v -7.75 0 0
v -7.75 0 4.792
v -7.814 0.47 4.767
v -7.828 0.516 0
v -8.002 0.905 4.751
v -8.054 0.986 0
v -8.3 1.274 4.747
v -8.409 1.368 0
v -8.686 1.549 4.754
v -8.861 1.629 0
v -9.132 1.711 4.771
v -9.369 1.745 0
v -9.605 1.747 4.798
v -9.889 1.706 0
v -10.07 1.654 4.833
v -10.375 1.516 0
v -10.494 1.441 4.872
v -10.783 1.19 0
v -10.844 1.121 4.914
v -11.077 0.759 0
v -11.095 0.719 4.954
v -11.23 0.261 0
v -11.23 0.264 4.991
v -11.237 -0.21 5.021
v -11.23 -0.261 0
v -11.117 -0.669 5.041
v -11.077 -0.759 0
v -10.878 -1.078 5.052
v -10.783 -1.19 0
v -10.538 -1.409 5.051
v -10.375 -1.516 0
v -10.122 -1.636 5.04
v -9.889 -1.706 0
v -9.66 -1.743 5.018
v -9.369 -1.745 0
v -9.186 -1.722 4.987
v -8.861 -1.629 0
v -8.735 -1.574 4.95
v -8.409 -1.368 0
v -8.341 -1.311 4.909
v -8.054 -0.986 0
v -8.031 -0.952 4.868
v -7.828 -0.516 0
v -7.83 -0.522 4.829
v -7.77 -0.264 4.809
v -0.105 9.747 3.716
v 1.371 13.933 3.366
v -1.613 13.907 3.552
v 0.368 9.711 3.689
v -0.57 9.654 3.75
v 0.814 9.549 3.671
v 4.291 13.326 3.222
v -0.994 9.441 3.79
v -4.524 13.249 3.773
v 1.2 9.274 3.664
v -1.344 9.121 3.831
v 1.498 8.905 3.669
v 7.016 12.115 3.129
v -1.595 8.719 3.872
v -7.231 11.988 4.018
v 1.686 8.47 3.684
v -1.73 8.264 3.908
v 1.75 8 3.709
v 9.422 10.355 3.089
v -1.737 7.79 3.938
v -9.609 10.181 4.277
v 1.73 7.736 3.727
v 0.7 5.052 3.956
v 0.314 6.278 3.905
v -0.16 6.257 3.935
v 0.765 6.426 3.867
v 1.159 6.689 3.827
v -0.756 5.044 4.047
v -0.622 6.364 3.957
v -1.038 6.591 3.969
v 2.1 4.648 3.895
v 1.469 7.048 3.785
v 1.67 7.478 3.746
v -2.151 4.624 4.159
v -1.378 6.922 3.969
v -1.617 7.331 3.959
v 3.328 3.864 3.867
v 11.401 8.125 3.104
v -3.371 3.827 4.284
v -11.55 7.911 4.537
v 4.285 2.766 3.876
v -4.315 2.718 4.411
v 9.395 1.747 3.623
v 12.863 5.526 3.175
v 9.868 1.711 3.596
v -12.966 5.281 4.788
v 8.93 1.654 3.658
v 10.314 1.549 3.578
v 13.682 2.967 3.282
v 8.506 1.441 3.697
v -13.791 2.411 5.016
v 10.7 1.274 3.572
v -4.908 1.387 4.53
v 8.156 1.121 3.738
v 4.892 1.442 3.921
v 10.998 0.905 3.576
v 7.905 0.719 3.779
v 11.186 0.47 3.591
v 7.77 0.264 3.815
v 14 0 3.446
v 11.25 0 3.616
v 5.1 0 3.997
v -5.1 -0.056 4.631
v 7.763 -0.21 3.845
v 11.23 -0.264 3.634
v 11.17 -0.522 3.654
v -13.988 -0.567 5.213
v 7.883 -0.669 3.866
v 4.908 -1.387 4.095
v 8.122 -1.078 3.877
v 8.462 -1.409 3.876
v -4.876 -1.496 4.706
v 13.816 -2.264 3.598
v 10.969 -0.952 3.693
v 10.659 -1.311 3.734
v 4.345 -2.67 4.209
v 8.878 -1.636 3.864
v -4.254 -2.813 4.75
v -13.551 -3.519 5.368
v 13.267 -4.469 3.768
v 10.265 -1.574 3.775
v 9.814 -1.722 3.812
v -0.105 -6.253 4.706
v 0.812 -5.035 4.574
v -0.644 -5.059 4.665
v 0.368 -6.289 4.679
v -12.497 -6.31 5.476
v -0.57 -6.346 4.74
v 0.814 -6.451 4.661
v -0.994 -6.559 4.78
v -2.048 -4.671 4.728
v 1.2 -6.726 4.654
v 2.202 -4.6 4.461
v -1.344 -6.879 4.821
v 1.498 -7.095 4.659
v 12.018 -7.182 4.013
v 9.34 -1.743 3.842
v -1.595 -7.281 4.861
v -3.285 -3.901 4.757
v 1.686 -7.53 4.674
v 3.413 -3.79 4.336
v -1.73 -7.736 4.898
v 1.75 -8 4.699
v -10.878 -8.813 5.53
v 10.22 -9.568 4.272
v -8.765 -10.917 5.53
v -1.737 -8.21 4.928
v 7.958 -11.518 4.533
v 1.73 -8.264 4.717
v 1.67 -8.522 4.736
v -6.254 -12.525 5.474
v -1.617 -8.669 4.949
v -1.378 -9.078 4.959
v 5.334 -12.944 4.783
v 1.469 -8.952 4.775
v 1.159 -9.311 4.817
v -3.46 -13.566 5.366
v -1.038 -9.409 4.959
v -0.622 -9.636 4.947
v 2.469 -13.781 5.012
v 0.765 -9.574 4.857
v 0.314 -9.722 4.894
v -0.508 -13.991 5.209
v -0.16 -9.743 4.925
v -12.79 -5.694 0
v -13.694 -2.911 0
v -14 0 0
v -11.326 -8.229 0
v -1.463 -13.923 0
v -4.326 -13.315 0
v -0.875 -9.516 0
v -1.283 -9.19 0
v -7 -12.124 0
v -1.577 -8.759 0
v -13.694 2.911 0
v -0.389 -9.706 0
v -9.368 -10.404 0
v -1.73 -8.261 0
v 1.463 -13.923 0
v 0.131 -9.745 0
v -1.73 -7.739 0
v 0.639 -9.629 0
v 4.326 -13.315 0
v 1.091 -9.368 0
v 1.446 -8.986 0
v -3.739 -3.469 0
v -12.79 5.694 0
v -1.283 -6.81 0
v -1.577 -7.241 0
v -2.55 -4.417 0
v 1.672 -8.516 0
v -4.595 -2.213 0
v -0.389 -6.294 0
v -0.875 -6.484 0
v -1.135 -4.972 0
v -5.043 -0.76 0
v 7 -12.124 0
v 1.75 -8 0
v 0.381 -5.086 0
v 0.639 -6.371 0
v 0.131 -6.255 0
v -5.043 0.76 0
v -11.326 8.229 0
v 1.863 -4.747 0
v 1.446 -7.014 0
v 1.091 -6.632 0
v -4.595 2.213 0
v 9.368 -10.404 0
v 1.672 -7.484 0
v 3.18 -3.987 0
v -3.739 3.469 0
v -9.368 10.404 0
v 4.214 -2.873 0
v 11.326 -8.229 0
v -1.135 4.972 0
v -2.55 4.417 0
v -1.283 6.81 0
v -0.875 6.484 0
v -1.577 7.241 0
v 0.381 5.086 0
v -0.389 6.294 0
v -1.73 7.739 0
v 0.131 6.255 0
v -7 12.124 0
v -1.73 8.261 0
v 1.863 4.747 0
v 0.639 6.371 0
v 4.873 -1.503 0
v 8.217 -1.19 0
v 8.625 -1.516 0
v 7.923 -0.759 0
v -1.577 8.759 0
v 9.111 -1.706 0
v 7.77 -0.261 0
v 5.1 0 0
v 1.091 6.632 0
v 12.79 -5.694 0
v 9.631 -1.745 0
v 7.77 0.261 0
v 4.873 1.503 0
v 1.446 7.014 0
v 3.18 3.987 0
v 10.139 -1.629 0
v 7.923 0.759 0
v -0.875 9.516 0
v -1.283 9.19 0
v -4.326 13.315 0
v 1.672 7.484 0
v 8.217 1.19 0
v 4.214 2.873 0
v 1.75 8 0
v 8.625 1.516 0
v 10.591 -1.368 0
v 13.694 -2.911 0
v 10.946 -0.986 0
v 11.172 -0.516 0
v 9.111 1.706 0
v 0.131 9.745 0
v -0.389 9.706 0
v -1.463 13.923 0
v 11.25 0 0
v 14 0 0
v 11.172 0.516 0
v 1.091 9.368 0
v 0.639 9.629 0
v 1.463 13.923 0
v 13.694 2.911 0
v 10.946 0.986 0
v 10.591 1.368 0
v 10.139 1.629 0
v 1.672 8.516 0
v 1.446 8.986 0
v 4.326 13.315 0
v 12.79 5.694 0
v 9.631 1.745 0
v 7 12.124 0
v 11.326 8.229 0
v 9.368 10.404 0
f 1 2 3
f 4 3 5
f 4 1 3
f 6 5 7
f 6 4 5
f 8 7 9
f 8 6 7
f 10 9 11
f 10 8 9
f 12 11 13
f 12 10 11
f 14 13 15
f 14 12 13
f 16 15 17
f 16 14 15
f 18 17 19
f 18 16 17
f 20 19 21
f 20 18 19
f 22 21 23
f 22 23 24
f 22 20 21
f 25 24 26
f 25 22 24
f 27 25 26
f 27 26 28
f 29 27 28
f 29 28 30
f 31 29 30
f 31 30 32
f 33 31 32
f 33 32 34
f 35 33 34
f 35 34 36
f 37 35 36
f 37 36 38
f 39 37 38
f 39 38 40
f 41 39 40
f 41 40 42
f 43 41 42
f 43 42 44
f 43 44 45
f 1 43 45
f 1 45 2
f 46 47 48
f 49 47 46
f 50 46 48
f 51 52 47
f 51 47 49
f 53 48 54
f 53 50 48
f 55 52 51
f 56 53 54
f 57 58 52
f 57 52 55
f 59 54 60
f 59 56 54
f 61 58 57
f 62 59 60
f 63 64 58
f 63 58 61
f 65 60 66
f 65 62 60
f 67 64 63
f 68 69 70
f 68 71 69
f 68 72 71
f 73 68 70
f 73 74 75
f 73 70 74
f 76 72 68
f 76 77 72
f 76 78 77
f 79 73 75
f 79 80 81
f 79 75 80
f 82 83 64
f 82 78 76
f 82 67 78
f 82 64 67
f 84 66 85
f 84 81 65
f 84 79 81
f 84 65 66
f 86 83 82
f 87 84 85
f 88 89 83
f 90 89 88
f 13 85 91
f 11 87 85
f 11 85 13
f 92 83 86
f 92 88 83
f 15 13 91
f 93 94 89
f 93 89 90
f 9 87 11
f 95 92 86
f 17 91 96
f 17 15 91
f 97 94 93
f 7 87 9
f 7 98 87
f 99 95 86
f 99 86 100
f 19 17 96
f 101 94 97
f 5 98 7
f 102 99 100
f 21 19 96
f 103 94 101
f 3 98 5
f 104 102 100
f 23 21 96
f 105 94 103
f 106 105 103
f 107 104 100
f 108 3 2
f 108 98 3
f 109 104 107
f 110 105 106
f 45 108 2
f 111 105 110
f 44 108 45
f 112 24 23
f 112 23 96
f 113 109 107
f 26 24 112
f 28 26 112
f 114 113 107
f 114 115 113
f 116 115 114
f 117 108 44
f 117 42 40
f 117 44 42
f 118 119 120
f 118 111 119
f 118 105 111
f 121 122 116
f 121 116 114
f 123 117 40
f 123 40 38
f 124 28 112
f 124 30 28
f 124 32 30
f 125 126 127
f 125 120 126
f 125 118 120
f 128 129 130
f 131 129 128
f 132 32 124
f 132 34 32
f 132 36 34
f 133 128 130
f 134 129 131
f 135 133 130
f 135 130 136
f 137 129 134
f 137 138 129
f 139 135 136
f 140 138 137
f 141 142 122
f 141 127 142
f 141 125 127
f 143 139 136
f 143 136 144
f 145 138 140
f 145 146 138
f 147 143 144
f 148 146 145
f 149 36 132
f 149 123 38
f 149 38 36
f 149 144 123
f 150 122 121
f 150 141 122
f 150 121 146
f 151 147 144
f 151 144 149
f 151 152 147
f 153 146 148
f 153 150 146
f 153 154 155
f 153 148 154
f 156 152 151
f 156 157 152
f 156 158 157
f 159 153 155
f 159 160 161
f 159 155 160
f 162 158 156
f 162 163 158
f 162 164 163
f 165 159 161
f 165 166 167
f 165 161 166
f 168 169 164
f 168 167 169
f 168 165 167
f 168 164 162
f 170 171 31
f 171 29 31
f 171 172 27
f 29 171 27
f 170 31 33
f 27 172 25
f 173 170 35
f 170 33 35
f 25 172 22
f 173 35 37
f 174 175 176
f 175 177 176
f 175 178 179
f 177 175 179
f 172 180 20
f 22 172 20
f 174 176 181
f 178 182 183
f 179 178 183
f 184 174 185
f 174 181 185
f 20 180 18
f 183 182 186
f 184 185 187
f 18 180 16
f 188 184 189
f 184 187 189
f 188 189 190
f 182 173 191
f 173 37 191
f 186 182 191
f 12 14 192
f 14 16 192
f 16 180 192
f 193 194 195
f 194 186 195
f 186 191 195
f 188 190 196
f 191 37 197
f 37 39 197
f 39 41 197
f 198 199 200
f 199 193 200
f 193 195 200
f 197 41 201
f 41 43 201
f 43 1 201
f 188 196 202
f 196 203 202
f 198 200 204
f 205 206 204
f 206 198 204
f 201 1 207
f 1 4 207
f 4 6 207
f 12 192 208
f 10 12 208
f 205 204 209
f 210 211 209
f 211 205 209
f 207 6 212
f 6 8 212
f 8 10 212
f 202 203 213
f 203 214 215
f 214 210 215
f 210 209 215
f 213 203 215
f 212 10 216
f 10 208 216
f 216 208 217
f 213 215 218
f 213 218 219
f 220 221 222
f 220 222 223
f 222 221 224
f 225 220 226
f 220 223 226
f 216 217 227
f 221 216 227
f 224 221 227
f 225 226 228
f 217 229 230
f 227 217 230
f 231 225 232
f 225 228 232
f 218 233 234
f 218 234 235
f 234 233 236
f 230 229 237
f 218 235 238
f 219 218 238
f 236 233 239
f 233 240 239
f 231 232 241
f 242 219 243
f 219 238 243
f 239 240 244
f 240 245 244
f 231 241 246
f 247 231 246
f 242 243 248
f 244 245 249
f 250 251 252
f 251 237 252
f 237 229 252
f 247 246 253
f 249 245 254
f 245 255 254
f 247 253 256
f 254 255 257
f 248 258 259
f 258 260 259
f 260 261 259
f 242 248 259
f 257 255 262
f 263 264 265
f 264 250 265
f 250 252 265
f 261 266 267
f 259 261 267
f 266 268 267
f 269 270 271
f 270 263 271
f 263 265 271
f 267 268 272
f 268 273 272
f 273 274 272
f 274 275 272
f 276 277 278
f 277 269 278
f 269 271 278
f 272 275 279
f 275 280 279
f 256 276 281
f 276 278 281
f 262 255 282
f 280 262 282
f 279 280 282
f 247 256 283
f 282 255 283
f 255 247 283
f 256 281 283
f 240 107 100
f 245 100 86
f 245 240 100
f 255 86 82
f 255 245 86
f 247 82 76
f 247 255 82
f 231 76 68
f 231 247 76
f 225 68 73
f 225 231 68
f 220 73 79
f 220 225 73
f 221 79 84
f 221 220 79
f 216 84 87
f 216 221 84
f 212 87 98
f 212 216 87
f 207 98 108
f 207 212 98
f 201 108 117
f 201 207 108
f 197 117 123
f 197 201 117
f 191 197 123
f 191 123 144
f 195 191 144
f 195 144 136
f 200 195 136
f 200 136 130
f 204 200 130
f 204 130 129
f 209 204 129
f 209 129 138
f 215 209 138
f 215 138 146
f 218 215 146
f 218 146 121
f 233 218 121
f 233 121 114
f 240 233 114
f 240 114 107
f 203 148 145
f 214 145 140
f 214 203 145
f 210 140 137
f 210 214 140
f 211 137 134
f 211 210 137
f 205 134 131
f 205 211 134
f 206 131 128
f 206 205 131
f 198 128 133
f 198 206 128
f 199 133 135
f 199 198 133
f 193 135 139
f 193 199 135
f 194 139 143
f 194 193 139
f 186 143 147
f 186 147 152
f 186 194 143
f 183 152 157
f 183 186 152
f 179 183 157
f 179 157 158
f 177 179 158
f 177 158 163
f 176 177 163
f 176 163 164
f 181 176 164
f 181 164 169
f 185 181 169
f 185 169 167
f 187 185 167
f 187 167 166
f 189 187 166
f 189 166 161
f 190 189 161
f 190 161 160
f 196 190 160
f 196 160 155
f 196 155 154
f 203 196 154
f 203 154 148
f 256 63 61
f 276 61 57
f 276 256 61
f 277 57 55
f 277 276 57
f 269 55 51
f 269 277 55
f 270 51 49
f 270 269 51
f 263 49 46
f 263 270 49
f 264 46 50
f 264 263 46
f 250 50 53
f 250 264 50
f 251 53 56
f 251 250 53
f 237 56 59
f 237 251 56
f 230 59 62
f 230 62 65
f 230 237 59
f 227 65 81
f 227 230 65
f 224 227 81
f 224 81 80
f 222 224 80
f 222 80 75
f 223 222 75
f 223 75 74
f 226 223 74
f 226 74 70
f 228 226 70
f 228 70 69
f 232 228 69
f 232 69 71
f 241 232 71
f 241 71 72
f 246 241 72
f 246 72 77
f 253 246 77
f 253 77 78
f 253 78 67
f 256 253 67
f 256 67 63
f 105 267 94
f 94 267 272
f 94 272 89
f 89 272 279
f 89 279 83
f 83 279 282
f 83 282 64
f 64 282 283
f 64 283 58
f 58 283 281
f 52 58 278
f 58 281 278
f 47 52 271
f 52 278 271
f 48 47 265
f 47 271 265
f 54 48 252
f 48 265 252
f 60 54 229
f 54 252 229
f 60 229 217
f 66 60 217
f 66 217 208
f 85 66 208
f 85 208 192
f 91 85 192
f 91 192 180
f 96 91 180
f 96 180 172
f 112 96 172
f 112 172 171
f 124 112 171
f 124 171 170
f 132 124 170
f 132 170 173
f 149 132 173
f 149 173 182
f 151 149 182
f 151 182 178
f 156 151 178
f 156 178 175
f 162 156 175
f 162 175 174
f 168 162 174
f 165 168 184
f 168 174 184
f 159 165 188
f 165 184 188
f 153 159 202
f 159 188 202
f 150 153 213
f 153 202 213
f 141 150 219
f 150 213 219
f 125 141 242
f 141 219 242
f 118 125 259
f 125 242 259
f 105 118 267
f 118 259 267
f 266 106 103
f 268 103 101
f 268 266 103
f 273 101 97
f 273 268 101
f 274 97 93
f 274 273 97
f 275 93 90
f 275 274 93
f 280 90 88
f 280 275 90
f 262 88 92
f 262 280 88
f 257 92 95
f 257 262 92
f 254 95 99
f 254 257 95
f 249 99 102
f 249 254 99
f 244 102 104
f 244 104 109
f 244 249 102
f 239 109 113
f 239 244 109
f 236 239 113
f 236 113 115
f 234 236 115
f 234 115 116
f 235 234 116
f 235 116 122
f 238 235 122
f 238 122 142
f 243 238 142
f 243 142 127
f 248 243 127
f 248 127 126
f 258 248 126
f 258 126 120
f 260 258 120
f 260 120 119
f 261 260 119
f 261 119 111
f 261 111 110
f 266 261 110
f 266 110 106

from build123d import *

# Parameters (mm, degrees)
F0_R     = 14
F0_R_2   = 1.75
F0_R_3   = 5.1
F1_DEPTH = 10
F5_W     = 30
F5_H     = 3
F6_DEPTH = 40


with BuildPart() as f1:
    # F0 (on Top) → F1 (new body)
    with BuildSketch(Plane.XY):
        Circle(F0_R)
        with Locations((0, -8)):
            Circle(F0_R_2, mode=Mode.SUBTRACT)
        with Locations((-9.5, 0)):
            Circle(F0_R_2, mode=Mode.SUBTRACT)
        Circle(F0_R_3, mode=Mode.SUBTRACT)
        with Locations((9.5, 0)):
            Circle(F0_R_2, mode=Mode.SUBTRACT)
        with Locations((0, 8)):
            Circle(F0_R_2, mode=Mode.SUBTRACT)
    extrude(amount=F1_DEPTH)

    # F5 (on face) → F6 (intersect)
    with BuildSketch(Plane(origin=(17.6776695297, -17.6776695297, 0), x_dir=(0.7071067812, 0.7071067812, 0), z_dir=(0.7071067812, -0.7071067812, 0))):
        Polygon((-15, 5.6246599058), (-15, 0), (15, 0), (15, 3), align=None)
        with Locations((0, -1.5)):
            Rectangle(F5_W, F5_H)
    extrude(amount=-F6_DEPTH, mode=Mode.INTERSECT)


solid = f1.part
